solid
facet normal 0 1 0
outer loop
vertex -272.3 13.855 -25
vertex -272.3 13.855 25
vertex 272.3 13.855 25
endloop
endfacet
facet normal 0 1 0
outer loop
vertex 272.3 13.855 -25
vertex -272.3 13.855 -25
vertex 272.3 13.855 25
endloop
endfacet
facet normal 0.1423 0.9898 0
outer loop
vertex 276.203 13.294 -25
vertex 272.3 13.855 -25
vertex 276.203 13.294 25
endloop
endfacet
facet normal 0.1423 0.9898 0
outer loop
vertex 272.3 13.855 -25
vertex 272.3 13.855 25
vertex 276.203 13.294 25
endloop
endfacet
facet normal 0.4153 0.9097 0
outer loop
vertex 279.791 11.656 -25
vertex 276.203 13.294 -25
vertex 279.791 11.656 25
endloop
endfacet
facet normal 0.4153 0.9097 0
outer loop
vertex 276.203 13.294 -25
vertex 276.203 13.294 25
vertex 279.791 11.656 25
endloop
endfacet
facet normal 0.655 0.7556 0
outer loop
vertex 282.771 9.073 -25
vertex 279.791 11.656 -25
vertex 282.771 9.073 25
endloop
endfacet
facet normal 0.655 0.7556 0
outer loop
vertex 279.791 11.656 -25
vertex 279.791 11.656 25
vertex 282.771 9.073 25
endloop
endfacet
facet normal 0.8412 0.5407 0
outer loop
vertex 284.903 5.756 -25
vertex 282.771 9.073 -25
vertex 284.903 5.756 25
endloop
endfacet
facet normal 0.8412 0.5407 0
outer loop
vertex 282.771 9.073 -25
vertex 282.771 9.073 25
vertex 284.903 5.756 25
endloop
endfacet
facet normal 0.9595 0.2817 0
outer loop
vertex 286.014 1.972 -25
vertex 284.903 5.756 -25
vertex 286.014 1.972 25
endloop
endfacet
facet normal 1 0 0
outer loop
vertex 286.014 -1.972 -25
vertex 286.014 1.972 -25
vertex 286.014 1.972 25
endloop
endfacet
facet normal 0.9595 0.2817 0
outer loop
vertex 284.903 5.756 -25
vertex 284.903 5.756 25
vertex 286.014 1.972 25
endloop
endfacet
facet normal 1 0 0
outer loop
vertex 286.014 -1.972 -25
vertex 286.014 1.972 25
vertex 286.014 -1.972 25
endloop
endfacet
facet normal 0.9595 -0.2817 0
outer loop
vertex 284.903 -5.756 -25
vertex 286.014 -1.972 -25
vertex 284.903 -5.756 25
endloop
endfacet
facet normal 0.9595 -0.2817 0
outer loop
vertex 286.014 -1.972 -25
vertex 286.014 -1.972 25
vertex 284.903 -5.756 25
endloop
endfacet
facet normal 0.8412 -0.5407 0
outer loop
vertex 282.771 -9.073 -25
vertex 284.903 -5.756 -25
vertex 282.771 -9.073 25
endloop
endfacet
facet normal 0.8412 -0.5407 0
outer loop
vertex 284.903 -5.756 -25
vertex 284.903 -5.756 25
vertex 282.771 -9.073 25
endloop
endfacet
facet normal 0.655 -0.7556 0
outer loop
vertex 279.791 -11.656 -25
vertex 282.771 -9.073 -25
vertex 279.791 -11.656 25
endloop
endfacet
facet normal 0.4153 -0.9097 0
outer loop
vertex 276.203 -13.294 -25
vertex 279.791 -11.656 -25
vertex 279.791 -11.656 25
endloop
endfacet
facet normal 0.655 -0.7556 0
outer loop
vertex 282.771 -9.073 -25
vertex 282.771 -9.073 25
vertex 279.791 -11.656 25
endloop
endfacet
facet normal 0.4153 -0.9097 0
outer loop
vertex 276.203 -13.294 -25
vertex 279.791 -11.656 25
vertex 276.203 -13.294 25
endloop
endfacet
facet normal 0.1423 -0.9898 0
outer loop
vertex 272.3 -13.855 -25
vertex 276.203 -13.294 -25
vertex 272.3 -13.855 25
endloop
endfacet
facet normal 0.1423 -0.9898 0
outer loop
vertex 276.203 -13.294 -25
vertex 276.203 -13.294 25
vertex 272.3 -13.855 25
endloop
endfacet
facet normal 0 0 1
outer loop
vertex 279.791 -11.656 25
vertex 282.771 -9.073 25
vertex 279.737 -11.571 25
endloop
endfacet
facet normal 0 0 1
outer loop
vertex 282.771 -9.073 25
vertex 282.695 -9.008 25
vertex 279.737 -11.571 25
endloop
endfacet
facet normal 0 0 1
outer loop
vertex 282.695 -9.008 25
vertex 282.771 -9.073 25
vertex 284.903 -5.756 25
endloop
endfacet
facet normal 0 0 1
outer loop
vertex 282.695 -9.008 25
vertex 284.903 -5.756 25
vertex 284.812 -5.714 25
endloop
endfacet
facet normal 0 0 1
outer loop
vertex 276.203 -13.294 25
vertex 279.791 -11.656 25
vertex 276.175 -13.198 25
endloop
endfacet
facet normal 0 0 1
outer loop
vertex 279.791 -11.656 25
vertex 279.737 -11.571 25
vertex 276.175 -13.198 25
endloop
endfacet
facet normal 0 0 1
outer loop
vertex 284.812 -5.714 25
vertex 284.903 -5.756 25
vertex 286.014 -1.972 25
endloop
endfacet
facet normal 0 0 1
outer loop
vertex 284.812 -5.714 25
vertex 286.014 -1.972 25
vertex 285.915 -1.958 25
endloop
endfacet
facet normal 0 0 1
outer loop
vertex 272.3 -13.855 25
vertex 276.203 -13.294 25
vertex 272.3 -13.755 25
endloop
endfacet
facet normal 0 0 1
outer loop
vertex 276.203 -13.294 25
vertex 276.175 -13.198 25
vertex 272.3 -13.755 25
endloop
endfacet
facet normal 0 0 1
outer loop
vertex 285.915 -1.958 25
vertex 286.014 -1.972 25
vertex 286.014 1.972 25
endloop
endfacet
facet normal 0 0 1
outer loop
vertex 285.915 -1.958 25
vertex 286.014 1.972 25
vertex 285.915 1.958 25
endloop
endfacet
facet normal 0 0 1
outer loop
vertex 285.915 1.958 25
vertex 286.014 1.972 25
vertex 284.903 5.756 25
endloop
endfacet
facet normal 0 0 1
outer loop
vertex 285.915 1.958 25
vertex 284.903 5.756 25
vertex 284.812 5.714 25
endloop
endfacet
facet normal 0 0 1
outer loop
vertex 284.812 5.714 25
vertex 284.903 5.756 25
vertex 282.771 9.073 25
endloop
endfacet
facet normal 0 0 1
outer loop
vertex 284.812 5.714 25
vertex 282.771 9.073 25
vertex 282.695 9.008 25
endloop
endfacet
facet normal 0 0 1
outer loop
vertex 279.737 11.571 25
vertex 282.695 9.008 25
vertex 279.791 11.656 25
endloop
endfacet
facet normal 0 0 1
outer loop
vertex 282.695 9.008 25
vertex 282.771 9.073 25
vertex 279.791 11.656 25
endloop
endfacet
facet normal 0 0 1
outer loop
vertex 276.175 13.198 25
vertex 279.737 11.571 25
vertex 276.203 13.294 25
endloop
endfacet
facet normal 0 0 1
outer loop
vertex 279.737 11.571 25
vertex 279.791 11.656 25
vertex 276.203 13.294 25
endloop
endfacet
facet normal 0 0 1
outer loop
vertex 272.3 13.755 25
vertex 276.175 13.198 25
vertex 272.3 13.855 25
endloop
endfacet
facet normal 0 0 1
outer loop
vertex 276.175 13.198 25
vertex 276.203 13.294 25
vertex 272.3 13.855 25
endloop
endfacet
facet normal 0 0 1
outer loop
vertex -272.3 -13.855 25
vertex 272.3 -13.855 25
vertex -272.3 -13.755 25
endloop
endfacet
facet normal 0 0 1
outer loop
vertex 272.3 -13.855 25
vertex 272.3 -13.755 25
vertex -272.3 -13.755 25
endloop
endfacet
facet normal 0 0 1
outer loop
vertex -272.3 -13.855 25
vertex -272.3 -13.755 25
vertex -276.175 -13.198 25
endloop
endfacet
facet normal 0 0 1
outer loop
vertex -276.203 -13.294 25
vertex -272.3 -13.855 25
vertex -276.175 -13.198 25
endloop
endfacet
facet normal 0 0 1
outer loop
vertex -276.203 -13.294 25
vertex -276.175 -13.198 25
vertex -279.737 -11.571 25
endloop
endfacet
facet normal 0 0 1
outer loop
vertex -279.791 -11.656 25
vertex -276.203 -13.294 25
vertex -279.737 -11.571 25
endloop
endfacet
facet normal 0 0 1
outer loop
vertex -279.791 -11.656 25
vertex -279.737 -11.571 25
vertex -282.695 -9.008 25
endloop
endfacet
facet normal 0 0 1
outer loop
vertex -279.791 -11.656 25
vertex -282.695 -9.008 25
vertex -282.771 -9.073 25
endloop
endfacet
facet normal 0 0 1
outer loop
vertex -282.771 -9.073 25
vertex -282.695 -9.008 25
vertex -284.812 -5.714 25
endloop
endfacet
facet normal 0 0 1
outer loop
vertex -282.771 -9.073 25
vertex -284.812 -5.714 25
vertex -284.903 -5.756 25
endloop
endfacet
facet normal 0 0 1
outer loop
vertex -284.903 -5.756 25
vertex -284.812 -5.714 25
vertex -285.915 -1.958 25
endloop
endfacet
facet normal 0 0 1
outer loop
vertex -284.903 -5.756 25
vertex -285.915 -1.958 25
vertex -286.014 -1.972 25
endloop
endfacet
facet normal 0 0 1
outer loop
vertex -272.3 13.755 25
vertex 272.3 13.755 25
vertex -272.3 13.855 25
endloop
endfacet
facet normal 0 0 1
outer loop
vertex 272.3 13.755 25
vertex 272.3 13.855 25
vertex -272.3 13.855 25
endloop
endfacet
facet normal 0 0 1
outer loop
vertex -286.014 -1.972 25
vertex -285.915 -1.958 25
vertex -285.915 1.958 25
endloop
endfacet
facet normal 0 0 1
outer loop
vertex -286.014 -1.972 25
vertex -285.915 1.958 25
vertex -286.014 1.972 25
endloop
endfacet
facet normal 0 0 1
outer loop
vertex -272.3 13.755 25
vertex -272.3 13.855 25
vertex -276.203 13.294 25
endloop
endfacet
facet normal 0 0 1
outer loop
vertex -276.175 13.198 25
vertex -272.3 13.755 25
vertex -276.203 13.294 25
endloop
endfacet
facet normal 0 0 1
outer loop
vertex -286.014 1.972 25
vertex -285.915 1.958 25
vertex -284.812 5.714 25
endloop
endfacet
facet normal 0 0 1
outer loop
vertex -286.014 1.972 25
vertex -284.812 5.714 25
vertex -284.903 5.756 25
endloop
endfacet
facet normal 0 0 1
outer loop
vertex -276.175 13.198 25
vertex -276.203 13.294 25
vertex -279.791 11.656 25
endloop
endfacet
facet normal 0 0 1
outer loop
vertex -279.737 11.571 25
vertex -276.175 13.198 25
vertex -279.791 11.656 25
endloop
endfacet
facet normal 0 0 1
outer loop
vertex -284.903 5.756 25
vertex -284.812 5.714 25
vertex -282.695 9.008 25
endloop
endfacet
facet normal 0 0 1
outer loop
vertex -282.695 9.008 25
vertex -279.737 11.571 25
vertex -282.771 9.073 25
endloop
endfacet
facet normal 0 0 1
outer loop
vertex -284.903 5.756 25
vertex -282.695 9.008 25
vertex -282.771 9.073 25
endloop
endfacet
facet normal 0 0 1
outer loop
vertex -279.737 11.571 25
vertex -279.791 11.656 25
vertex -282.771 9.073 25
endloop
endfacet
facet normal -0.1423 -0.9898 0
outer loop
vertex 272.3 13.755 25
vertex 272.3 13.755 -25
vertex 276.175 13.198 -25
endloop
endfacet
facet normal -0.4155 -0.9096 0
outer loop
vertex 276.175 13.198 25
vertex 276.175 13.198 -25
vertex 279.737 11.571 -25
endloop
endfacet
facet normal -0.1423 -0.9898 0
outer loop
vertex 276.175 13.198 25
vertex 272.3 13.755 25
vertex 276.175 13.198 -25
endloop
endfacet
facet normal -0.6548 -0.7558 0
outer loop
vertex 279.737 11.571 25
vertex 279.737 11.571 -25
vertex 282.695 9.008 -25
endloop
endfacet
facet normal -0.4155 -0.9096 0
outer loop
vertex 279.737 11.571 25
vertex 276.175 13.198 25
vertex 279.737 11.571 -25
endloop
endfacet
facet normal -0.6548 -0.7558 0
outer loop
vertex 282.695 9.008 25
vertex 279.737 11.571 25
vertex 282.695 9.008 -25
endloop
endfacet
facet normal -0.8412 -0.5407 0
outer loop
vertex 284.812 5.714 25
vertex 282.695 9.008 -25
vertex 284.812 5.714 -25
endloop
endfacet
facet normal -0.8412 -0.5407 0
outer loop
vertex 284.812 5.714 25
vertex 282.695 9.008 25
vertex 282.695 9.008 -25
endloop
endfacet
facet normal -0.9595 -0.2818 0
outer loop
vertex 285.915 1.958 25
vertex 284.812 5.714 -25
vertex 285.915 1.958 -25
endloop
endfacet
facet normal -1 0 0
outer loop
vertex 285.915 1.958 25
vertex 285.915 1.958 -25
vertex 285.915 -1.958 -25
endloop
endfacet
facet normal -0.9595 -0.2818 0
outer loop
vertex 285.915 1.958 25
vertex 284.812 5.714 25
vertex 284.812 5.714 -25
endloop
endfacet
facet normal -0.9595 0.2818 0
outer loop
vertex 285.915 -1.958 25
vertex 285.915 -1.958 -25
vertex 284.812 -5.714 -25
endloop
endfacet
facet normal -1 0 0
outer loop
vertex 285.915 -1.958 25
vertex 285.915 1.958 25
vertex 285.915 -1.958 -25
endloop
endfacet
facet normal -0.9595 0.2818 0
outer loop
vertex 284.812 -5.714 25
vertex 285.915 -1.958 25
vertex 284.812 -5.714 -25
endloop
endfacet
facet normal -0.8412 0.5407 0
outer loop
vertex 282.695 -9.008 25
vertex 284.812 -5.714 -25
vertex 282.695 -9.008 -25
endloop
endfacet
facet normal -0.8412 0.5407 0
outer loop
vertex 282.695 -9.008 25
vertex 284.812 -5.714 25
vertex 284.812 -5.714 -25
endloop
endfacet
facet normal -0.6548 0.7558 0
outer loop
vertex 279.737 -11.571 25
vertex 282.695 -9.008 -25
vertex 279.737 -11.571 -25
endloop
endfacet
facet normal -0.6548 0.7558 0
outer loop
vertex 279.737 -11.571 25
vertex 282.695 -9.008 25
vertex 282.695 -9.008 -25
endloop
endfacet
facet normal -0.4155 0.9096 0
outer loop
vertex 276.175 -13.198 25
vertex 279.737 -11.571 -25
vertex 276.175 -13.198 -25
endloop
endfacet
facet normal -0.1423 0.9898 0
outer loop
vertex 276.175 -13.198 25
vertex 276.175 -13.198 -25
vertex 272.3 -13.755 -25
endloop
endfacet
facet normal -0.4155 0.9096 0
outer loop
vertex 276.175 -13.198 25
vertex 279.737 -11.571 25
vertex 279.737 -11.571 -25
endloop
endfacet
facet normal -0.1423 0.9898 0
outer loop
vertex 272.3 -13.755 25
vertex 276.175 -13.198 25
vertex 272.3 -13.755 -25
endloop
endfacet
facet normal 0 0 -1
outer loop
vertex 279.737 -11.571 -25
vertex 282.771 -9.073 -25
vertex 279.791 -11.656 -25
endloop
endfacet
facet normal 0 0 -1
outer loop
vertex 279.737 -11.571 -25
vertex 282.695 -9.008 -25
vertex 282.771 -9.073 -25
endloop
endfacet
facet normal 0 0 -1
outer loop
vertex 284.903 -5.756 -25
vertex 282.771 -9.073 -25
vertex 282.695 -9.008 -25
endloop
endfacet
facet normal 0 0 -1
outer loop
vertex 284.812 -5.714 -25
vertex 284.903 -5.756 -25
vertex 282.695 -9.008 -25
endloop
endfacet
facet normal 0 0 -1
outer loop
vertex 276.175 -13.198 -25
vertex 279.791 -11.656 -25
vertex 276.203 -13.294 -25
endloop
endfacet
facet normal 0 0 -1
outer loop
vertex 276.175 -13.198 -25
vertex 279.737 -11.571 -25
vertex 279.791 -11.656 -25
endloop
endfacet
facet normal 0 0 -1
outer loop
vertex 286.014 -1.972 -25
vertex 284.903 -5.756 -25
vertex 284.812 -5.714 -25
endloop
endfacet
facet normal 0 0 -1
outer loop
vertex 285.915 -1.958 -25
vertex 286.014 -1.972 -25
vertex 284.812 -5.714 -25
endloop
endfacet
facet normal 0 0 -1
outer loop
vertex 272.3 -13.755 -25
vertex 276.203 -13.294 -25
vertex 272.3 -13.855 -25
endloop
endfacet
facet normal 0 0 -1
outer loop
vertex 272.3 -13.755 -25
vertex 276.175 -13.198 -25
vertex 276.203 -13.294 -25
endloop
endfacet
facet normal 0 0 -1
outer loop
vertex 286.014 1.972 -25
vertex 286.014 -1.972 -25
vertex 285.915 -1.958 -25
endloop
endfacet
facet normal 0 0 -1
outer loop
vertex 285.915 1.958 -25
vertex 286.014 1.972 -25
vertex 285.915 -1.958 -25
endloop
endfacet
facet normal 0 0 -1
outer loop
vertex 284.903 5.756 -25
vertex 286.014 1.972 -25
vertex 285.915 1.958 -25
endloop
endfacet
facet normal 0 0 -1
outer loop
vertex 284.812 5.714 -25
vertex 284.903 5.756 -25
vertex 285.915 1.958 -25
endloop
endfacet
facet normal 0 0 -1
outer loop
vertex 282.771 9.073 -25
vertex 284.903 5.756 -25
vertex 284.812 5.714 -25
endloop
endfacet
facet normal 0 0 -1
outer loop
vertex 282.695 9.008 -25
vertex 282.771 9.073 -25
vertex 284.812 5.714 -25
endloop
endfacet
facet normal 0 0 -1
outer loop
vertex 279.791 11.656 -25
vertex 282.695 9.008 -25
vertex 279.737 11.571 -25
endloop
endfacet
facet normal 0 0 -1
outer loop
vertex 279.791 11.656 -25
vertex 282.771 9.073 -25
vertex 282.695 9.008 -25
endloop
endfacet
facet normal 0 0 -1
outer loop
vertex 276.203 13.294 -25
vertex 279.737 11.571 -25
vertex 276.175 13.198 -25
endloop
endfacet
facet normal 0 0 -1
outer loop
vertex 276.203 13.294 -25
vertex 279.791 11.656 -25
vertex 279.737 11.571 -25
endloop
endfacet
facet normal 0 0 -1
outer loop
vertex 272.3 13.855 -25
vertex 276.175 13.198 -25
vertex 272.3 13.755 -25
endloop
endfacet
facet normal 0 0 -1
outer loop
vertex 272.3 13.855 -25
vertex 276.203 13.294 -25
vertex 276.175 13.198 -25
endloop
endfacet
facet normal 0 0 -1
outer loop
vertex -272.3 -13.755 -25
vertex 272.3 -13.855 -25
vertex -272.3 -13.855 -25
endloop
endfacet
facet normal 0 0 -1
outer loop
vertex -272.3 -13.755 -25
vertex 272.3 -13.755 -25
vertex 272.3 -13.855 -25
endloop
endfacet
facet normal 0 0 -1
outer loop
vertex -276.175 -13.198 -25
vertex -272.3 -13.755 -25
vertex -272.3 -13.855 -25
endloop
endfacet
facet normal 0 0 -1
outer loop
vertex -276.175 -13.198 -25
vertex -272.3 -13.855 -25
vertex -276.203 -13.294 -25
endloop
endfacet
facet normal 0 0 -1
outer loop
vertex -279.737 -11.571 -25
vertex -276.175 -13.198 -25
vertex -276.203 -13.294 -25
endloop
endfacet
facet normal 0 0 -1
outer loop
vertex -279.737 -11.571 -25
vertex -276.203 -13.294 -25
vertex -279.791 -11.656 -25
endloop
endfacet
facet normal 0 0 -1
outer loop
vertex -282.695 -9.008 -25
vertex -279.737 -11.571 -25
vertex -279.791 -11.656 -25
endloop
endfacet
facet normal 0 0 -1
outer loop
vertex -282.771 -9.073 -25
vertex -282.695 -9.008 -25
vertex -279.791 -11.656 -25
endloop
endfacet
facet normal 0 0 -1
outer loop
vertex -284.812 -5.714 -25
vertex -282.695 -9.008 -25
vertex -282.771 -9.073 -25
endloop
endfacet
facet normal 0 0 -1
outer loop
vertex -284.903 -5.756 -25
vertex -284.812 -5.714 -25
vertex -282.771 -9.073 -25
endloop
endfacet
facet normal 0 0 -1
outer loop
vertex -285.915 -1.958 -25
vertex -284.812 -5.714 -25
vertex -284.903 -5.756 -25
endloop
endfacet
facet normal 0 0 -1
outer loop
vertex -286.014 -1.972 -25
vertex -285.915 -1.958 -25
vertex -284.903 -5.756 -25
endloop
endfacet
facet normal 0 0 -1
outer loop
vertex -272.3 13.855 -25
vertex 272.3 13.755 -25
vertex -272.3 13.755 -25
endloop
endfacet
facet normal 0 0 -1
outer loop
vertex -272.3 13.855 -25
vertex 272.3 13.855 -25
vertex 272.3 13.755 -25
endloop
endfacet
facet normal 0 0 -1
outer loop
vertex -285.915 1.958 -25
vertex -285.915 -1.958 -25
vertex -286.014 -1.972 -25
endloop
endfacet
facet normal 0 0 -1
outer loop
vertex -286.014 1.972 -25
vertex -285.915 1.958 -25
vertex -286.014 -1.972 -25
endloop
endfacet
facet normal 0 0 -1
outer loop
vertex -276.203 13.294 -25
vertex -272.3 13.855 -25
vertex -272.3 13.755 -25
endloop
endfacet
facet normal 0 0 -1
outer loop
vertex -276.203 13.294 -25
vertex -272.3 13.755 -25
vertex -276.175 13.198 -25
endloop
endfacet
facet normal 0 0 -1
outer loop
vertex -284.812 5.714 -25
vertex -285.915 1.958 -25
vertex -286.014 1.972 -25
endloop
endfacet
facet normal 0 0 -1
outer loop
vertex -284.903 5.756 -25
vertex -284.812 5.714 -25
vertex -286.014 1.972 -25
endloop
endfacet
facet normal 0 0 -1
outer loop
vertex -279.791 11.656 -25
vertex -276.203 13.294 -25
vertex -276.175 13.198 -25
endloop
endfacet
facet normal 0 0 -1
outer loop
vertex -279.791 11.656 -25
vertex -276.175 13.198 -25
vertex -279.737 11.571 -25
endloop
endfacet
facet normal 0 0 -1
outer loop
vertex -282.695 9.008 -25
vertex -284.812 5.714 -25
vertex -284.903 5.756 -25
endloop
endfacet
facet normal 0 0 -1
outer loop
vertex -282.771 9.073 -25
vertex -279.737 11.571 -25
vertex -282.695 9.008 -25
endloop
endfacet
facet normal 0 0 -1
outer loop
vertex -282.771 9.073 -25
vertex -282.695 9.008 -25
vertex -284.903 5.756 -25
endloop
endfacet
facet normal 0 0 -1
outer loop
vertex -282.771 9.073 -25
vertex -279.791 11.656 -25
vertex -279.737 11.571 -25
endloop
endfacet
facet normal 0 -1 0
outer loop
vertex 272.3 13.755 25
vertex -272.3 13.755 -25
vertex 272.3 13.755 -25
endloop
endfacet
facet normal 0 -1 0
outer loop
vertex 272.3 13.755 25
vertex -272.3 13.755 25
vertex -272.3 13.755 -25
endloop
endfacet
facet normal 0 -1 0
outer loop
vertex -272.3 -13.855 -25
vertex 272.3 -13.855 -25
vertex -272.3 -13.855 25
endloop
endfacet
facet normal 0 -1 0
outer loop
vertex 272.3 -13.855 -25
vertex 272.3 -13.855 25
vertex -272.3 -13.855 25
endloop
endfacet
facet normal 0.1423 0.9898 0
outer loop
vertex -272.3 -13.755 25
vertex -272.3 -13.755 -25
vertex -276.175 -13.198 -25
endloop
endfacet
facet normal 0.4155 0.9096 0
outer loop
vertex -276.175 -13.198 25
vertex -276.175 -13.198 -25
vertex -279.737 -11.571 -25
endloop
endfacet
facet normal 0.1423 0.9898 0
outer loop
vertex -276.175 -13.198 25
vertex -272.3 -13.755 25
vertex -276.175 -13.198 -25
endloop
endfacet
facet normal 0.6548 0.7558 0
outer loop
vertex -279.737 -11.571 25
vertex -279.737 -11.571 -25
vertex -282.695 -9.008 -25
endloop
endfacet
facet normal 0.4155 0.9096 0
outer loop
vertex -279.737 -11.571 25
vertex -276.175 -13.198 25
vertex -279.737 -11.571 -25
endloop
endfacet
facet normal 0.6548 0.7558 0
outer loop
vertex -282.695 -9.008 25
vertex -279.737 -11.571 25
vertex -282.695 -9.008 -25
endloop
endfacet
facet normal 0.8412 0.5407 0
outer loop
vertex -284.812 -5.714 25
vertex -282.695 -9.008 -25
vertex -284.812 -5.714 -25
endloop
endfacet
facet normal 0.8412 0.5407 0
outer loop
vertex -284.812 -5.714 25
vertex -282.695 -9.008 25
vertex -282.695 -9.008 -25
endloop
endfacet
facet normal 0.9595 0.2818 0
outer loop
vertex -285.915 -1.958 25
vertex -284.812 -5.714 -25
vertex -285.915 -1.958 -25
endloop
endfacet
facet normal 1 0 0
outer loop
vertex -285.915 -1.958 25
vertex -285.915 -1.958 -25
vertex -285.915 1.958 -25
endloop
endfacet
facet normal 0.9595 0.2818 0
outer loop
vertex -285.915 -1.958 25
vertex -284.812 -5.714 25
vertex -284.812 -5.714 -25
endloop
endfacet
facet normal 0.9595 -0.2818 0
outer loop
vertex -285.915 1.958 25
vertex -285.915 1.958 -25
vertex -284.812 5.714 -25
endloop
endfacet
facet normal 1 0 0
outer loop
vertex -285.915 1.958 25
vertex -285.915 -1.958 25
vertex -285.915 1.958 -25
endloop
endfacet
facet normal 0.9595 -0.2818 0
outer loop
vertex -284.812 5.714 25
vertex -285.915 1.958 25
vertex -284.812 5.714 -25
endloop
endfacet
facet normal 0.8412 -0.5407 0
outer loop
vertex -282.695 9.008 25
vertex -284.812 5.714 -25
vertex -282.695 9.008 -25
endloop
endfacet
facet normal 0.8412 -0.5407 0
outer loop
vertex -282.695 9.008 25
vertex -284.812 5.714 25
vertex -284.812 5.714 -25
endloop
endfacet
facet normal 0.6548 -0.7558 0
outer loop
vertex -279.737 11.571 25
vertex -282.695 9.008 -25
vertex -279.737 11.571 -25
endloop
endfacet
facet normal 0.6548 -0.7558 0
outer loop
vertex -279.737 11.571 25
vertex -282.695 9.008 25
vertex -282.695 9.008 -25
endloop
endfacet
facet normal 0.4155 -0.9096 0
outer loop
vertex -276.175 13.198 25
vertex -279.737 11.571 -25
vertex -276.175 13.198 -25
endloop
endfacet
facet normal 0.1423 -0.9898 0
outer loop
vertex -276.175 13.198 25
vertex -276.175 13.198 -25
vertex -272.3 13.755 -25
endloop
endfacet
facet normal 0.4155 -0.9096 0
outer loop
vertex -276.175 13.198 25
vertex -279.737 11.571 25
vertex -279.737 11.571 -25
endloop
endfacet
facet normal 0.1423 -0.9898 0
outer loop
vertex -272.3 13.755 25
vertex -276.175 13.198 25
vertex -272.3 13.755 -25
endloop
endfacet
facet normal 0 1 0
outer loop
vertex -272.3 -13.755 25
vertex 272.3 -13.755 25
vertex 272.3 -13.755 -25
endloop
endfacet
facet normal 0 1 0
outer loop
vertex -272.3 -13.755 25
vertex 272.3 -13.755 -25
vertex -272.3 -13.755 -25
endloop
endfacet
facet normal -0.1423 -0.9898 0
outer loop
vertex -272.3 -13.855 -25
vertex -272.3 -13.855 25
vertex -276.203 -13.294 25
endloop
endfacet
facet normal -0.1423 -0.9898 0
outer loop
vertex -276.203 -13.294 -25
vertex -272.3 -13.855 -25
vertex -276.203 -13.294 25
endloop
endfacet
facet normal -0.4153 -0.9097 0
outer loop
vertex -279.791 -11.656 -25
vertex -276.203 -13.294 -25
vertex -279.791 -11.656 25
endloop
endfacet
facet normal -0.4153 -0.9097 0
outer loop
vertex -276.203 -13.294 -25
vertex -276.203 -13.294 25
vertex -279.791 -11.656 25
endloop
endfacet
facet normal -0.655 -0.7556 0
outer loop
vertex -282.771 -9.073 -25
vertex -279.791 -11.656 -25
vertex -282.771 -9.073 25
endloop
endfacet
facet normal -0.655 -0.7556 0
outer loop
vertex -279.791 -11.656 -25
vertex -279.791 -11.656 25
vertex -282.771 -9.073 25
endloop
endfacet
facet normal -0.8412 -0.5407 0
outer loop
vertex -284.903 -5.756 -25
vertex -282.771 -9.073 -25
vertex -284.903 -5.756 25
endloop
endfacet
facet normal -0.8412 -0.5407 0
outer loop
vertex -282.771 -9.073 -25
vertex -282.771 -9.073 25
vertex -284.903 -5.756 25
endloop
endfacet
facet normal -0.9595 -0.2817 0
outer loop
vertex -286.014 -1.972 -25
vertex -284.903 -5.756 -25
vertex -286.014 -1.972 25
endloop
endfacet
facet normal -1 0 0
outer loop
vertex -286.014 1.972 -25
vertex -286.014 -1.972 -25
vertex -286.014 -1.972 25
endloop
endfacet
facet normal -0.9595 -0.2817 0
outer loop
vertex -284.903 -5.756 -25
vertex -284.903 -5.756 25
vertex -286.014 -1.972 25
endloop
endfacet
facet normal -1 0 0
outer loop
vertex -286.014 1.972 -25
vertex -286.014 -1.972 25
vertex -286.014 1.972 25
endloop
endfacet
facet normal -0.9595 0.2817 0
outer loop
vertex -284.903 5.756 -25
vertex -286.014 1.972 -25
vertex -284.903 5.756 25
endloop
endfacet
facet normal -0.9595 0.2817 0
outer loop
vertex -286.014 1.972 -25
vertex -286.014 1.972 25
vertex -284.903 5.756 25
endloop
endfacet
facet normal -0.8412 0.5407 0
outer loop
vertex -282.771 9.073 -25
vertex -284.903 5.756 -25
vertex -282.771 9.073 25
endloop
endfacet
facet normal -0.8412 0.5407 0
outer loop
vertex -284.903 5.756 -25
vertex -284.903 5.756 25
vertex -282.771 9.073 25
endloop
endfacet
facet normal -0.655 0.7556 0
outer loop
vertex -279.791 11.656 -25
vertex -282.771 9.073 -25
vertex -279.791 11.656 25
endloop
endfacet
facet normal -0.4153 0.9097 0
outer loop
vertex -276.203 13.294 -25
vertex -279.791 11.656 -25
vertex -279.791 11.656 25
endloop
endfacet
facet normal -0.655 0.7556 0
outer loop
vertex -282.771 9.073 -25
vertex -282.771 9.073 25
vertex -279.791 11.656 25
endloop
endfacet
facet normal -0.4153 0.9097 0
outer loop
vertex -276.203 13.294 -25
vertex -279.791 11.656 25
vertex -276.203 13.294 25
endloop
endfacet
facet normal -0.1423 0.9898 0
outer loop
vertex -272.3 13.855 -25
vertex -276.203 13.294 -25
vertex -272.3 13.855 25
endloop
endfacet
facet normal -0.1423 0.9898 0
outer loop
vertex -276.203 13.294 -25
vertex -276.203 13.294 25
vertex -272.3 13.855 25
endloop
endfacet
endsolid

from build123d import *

# Parameters (mm, degrees)
EXTRU_MINCE1_DEPTH      = 25
EXTRU_MINCE1_DEPTH_BACK = 25


with BuildPart() as part:
    # Esquisse2 → Extru.-Mince1 (new body, two sides)
    with BuildSketch(Plane.XY) as extru_mince1_sk:
        with BuildLine():
            Line((-272.299999984, 13.855), (272.300004367, 13.855))
            ThreePointArc((272.300004367, 13.855), (286.155004367, -2.192e-06), (272.299999984, -13.855))
            Line((272.299999984, -13.855), (-272.300004367, -13.855))
            ThreePointArc((-272.300004367, -13.855), (-286.155004367, 2.192e-06), (-272.299999984, 13.855))
        make_face()
        with BuildLine():
            Line((-272.3, 13.755), (272.3, 13.755))
            ThreePointArc((272.3, 13.755), (286.055004367, 0), (272.3, -13.755))
            Line((272.3, -13.755), (-272.3, -13.755))
            ThreePointArc((-272.3, -13.755), (-286.055004367, 0), (-272.3, 13.755))
        make_face(mode=Mode.SUBTRACT)
    extrude(amount=EXTRU_MINCE1_DEPTH)
    extrude(extru_mince1_sk.sketch, amount=-EXTRU_MINCE1_DEPTH_BACK)


solid = part.part
